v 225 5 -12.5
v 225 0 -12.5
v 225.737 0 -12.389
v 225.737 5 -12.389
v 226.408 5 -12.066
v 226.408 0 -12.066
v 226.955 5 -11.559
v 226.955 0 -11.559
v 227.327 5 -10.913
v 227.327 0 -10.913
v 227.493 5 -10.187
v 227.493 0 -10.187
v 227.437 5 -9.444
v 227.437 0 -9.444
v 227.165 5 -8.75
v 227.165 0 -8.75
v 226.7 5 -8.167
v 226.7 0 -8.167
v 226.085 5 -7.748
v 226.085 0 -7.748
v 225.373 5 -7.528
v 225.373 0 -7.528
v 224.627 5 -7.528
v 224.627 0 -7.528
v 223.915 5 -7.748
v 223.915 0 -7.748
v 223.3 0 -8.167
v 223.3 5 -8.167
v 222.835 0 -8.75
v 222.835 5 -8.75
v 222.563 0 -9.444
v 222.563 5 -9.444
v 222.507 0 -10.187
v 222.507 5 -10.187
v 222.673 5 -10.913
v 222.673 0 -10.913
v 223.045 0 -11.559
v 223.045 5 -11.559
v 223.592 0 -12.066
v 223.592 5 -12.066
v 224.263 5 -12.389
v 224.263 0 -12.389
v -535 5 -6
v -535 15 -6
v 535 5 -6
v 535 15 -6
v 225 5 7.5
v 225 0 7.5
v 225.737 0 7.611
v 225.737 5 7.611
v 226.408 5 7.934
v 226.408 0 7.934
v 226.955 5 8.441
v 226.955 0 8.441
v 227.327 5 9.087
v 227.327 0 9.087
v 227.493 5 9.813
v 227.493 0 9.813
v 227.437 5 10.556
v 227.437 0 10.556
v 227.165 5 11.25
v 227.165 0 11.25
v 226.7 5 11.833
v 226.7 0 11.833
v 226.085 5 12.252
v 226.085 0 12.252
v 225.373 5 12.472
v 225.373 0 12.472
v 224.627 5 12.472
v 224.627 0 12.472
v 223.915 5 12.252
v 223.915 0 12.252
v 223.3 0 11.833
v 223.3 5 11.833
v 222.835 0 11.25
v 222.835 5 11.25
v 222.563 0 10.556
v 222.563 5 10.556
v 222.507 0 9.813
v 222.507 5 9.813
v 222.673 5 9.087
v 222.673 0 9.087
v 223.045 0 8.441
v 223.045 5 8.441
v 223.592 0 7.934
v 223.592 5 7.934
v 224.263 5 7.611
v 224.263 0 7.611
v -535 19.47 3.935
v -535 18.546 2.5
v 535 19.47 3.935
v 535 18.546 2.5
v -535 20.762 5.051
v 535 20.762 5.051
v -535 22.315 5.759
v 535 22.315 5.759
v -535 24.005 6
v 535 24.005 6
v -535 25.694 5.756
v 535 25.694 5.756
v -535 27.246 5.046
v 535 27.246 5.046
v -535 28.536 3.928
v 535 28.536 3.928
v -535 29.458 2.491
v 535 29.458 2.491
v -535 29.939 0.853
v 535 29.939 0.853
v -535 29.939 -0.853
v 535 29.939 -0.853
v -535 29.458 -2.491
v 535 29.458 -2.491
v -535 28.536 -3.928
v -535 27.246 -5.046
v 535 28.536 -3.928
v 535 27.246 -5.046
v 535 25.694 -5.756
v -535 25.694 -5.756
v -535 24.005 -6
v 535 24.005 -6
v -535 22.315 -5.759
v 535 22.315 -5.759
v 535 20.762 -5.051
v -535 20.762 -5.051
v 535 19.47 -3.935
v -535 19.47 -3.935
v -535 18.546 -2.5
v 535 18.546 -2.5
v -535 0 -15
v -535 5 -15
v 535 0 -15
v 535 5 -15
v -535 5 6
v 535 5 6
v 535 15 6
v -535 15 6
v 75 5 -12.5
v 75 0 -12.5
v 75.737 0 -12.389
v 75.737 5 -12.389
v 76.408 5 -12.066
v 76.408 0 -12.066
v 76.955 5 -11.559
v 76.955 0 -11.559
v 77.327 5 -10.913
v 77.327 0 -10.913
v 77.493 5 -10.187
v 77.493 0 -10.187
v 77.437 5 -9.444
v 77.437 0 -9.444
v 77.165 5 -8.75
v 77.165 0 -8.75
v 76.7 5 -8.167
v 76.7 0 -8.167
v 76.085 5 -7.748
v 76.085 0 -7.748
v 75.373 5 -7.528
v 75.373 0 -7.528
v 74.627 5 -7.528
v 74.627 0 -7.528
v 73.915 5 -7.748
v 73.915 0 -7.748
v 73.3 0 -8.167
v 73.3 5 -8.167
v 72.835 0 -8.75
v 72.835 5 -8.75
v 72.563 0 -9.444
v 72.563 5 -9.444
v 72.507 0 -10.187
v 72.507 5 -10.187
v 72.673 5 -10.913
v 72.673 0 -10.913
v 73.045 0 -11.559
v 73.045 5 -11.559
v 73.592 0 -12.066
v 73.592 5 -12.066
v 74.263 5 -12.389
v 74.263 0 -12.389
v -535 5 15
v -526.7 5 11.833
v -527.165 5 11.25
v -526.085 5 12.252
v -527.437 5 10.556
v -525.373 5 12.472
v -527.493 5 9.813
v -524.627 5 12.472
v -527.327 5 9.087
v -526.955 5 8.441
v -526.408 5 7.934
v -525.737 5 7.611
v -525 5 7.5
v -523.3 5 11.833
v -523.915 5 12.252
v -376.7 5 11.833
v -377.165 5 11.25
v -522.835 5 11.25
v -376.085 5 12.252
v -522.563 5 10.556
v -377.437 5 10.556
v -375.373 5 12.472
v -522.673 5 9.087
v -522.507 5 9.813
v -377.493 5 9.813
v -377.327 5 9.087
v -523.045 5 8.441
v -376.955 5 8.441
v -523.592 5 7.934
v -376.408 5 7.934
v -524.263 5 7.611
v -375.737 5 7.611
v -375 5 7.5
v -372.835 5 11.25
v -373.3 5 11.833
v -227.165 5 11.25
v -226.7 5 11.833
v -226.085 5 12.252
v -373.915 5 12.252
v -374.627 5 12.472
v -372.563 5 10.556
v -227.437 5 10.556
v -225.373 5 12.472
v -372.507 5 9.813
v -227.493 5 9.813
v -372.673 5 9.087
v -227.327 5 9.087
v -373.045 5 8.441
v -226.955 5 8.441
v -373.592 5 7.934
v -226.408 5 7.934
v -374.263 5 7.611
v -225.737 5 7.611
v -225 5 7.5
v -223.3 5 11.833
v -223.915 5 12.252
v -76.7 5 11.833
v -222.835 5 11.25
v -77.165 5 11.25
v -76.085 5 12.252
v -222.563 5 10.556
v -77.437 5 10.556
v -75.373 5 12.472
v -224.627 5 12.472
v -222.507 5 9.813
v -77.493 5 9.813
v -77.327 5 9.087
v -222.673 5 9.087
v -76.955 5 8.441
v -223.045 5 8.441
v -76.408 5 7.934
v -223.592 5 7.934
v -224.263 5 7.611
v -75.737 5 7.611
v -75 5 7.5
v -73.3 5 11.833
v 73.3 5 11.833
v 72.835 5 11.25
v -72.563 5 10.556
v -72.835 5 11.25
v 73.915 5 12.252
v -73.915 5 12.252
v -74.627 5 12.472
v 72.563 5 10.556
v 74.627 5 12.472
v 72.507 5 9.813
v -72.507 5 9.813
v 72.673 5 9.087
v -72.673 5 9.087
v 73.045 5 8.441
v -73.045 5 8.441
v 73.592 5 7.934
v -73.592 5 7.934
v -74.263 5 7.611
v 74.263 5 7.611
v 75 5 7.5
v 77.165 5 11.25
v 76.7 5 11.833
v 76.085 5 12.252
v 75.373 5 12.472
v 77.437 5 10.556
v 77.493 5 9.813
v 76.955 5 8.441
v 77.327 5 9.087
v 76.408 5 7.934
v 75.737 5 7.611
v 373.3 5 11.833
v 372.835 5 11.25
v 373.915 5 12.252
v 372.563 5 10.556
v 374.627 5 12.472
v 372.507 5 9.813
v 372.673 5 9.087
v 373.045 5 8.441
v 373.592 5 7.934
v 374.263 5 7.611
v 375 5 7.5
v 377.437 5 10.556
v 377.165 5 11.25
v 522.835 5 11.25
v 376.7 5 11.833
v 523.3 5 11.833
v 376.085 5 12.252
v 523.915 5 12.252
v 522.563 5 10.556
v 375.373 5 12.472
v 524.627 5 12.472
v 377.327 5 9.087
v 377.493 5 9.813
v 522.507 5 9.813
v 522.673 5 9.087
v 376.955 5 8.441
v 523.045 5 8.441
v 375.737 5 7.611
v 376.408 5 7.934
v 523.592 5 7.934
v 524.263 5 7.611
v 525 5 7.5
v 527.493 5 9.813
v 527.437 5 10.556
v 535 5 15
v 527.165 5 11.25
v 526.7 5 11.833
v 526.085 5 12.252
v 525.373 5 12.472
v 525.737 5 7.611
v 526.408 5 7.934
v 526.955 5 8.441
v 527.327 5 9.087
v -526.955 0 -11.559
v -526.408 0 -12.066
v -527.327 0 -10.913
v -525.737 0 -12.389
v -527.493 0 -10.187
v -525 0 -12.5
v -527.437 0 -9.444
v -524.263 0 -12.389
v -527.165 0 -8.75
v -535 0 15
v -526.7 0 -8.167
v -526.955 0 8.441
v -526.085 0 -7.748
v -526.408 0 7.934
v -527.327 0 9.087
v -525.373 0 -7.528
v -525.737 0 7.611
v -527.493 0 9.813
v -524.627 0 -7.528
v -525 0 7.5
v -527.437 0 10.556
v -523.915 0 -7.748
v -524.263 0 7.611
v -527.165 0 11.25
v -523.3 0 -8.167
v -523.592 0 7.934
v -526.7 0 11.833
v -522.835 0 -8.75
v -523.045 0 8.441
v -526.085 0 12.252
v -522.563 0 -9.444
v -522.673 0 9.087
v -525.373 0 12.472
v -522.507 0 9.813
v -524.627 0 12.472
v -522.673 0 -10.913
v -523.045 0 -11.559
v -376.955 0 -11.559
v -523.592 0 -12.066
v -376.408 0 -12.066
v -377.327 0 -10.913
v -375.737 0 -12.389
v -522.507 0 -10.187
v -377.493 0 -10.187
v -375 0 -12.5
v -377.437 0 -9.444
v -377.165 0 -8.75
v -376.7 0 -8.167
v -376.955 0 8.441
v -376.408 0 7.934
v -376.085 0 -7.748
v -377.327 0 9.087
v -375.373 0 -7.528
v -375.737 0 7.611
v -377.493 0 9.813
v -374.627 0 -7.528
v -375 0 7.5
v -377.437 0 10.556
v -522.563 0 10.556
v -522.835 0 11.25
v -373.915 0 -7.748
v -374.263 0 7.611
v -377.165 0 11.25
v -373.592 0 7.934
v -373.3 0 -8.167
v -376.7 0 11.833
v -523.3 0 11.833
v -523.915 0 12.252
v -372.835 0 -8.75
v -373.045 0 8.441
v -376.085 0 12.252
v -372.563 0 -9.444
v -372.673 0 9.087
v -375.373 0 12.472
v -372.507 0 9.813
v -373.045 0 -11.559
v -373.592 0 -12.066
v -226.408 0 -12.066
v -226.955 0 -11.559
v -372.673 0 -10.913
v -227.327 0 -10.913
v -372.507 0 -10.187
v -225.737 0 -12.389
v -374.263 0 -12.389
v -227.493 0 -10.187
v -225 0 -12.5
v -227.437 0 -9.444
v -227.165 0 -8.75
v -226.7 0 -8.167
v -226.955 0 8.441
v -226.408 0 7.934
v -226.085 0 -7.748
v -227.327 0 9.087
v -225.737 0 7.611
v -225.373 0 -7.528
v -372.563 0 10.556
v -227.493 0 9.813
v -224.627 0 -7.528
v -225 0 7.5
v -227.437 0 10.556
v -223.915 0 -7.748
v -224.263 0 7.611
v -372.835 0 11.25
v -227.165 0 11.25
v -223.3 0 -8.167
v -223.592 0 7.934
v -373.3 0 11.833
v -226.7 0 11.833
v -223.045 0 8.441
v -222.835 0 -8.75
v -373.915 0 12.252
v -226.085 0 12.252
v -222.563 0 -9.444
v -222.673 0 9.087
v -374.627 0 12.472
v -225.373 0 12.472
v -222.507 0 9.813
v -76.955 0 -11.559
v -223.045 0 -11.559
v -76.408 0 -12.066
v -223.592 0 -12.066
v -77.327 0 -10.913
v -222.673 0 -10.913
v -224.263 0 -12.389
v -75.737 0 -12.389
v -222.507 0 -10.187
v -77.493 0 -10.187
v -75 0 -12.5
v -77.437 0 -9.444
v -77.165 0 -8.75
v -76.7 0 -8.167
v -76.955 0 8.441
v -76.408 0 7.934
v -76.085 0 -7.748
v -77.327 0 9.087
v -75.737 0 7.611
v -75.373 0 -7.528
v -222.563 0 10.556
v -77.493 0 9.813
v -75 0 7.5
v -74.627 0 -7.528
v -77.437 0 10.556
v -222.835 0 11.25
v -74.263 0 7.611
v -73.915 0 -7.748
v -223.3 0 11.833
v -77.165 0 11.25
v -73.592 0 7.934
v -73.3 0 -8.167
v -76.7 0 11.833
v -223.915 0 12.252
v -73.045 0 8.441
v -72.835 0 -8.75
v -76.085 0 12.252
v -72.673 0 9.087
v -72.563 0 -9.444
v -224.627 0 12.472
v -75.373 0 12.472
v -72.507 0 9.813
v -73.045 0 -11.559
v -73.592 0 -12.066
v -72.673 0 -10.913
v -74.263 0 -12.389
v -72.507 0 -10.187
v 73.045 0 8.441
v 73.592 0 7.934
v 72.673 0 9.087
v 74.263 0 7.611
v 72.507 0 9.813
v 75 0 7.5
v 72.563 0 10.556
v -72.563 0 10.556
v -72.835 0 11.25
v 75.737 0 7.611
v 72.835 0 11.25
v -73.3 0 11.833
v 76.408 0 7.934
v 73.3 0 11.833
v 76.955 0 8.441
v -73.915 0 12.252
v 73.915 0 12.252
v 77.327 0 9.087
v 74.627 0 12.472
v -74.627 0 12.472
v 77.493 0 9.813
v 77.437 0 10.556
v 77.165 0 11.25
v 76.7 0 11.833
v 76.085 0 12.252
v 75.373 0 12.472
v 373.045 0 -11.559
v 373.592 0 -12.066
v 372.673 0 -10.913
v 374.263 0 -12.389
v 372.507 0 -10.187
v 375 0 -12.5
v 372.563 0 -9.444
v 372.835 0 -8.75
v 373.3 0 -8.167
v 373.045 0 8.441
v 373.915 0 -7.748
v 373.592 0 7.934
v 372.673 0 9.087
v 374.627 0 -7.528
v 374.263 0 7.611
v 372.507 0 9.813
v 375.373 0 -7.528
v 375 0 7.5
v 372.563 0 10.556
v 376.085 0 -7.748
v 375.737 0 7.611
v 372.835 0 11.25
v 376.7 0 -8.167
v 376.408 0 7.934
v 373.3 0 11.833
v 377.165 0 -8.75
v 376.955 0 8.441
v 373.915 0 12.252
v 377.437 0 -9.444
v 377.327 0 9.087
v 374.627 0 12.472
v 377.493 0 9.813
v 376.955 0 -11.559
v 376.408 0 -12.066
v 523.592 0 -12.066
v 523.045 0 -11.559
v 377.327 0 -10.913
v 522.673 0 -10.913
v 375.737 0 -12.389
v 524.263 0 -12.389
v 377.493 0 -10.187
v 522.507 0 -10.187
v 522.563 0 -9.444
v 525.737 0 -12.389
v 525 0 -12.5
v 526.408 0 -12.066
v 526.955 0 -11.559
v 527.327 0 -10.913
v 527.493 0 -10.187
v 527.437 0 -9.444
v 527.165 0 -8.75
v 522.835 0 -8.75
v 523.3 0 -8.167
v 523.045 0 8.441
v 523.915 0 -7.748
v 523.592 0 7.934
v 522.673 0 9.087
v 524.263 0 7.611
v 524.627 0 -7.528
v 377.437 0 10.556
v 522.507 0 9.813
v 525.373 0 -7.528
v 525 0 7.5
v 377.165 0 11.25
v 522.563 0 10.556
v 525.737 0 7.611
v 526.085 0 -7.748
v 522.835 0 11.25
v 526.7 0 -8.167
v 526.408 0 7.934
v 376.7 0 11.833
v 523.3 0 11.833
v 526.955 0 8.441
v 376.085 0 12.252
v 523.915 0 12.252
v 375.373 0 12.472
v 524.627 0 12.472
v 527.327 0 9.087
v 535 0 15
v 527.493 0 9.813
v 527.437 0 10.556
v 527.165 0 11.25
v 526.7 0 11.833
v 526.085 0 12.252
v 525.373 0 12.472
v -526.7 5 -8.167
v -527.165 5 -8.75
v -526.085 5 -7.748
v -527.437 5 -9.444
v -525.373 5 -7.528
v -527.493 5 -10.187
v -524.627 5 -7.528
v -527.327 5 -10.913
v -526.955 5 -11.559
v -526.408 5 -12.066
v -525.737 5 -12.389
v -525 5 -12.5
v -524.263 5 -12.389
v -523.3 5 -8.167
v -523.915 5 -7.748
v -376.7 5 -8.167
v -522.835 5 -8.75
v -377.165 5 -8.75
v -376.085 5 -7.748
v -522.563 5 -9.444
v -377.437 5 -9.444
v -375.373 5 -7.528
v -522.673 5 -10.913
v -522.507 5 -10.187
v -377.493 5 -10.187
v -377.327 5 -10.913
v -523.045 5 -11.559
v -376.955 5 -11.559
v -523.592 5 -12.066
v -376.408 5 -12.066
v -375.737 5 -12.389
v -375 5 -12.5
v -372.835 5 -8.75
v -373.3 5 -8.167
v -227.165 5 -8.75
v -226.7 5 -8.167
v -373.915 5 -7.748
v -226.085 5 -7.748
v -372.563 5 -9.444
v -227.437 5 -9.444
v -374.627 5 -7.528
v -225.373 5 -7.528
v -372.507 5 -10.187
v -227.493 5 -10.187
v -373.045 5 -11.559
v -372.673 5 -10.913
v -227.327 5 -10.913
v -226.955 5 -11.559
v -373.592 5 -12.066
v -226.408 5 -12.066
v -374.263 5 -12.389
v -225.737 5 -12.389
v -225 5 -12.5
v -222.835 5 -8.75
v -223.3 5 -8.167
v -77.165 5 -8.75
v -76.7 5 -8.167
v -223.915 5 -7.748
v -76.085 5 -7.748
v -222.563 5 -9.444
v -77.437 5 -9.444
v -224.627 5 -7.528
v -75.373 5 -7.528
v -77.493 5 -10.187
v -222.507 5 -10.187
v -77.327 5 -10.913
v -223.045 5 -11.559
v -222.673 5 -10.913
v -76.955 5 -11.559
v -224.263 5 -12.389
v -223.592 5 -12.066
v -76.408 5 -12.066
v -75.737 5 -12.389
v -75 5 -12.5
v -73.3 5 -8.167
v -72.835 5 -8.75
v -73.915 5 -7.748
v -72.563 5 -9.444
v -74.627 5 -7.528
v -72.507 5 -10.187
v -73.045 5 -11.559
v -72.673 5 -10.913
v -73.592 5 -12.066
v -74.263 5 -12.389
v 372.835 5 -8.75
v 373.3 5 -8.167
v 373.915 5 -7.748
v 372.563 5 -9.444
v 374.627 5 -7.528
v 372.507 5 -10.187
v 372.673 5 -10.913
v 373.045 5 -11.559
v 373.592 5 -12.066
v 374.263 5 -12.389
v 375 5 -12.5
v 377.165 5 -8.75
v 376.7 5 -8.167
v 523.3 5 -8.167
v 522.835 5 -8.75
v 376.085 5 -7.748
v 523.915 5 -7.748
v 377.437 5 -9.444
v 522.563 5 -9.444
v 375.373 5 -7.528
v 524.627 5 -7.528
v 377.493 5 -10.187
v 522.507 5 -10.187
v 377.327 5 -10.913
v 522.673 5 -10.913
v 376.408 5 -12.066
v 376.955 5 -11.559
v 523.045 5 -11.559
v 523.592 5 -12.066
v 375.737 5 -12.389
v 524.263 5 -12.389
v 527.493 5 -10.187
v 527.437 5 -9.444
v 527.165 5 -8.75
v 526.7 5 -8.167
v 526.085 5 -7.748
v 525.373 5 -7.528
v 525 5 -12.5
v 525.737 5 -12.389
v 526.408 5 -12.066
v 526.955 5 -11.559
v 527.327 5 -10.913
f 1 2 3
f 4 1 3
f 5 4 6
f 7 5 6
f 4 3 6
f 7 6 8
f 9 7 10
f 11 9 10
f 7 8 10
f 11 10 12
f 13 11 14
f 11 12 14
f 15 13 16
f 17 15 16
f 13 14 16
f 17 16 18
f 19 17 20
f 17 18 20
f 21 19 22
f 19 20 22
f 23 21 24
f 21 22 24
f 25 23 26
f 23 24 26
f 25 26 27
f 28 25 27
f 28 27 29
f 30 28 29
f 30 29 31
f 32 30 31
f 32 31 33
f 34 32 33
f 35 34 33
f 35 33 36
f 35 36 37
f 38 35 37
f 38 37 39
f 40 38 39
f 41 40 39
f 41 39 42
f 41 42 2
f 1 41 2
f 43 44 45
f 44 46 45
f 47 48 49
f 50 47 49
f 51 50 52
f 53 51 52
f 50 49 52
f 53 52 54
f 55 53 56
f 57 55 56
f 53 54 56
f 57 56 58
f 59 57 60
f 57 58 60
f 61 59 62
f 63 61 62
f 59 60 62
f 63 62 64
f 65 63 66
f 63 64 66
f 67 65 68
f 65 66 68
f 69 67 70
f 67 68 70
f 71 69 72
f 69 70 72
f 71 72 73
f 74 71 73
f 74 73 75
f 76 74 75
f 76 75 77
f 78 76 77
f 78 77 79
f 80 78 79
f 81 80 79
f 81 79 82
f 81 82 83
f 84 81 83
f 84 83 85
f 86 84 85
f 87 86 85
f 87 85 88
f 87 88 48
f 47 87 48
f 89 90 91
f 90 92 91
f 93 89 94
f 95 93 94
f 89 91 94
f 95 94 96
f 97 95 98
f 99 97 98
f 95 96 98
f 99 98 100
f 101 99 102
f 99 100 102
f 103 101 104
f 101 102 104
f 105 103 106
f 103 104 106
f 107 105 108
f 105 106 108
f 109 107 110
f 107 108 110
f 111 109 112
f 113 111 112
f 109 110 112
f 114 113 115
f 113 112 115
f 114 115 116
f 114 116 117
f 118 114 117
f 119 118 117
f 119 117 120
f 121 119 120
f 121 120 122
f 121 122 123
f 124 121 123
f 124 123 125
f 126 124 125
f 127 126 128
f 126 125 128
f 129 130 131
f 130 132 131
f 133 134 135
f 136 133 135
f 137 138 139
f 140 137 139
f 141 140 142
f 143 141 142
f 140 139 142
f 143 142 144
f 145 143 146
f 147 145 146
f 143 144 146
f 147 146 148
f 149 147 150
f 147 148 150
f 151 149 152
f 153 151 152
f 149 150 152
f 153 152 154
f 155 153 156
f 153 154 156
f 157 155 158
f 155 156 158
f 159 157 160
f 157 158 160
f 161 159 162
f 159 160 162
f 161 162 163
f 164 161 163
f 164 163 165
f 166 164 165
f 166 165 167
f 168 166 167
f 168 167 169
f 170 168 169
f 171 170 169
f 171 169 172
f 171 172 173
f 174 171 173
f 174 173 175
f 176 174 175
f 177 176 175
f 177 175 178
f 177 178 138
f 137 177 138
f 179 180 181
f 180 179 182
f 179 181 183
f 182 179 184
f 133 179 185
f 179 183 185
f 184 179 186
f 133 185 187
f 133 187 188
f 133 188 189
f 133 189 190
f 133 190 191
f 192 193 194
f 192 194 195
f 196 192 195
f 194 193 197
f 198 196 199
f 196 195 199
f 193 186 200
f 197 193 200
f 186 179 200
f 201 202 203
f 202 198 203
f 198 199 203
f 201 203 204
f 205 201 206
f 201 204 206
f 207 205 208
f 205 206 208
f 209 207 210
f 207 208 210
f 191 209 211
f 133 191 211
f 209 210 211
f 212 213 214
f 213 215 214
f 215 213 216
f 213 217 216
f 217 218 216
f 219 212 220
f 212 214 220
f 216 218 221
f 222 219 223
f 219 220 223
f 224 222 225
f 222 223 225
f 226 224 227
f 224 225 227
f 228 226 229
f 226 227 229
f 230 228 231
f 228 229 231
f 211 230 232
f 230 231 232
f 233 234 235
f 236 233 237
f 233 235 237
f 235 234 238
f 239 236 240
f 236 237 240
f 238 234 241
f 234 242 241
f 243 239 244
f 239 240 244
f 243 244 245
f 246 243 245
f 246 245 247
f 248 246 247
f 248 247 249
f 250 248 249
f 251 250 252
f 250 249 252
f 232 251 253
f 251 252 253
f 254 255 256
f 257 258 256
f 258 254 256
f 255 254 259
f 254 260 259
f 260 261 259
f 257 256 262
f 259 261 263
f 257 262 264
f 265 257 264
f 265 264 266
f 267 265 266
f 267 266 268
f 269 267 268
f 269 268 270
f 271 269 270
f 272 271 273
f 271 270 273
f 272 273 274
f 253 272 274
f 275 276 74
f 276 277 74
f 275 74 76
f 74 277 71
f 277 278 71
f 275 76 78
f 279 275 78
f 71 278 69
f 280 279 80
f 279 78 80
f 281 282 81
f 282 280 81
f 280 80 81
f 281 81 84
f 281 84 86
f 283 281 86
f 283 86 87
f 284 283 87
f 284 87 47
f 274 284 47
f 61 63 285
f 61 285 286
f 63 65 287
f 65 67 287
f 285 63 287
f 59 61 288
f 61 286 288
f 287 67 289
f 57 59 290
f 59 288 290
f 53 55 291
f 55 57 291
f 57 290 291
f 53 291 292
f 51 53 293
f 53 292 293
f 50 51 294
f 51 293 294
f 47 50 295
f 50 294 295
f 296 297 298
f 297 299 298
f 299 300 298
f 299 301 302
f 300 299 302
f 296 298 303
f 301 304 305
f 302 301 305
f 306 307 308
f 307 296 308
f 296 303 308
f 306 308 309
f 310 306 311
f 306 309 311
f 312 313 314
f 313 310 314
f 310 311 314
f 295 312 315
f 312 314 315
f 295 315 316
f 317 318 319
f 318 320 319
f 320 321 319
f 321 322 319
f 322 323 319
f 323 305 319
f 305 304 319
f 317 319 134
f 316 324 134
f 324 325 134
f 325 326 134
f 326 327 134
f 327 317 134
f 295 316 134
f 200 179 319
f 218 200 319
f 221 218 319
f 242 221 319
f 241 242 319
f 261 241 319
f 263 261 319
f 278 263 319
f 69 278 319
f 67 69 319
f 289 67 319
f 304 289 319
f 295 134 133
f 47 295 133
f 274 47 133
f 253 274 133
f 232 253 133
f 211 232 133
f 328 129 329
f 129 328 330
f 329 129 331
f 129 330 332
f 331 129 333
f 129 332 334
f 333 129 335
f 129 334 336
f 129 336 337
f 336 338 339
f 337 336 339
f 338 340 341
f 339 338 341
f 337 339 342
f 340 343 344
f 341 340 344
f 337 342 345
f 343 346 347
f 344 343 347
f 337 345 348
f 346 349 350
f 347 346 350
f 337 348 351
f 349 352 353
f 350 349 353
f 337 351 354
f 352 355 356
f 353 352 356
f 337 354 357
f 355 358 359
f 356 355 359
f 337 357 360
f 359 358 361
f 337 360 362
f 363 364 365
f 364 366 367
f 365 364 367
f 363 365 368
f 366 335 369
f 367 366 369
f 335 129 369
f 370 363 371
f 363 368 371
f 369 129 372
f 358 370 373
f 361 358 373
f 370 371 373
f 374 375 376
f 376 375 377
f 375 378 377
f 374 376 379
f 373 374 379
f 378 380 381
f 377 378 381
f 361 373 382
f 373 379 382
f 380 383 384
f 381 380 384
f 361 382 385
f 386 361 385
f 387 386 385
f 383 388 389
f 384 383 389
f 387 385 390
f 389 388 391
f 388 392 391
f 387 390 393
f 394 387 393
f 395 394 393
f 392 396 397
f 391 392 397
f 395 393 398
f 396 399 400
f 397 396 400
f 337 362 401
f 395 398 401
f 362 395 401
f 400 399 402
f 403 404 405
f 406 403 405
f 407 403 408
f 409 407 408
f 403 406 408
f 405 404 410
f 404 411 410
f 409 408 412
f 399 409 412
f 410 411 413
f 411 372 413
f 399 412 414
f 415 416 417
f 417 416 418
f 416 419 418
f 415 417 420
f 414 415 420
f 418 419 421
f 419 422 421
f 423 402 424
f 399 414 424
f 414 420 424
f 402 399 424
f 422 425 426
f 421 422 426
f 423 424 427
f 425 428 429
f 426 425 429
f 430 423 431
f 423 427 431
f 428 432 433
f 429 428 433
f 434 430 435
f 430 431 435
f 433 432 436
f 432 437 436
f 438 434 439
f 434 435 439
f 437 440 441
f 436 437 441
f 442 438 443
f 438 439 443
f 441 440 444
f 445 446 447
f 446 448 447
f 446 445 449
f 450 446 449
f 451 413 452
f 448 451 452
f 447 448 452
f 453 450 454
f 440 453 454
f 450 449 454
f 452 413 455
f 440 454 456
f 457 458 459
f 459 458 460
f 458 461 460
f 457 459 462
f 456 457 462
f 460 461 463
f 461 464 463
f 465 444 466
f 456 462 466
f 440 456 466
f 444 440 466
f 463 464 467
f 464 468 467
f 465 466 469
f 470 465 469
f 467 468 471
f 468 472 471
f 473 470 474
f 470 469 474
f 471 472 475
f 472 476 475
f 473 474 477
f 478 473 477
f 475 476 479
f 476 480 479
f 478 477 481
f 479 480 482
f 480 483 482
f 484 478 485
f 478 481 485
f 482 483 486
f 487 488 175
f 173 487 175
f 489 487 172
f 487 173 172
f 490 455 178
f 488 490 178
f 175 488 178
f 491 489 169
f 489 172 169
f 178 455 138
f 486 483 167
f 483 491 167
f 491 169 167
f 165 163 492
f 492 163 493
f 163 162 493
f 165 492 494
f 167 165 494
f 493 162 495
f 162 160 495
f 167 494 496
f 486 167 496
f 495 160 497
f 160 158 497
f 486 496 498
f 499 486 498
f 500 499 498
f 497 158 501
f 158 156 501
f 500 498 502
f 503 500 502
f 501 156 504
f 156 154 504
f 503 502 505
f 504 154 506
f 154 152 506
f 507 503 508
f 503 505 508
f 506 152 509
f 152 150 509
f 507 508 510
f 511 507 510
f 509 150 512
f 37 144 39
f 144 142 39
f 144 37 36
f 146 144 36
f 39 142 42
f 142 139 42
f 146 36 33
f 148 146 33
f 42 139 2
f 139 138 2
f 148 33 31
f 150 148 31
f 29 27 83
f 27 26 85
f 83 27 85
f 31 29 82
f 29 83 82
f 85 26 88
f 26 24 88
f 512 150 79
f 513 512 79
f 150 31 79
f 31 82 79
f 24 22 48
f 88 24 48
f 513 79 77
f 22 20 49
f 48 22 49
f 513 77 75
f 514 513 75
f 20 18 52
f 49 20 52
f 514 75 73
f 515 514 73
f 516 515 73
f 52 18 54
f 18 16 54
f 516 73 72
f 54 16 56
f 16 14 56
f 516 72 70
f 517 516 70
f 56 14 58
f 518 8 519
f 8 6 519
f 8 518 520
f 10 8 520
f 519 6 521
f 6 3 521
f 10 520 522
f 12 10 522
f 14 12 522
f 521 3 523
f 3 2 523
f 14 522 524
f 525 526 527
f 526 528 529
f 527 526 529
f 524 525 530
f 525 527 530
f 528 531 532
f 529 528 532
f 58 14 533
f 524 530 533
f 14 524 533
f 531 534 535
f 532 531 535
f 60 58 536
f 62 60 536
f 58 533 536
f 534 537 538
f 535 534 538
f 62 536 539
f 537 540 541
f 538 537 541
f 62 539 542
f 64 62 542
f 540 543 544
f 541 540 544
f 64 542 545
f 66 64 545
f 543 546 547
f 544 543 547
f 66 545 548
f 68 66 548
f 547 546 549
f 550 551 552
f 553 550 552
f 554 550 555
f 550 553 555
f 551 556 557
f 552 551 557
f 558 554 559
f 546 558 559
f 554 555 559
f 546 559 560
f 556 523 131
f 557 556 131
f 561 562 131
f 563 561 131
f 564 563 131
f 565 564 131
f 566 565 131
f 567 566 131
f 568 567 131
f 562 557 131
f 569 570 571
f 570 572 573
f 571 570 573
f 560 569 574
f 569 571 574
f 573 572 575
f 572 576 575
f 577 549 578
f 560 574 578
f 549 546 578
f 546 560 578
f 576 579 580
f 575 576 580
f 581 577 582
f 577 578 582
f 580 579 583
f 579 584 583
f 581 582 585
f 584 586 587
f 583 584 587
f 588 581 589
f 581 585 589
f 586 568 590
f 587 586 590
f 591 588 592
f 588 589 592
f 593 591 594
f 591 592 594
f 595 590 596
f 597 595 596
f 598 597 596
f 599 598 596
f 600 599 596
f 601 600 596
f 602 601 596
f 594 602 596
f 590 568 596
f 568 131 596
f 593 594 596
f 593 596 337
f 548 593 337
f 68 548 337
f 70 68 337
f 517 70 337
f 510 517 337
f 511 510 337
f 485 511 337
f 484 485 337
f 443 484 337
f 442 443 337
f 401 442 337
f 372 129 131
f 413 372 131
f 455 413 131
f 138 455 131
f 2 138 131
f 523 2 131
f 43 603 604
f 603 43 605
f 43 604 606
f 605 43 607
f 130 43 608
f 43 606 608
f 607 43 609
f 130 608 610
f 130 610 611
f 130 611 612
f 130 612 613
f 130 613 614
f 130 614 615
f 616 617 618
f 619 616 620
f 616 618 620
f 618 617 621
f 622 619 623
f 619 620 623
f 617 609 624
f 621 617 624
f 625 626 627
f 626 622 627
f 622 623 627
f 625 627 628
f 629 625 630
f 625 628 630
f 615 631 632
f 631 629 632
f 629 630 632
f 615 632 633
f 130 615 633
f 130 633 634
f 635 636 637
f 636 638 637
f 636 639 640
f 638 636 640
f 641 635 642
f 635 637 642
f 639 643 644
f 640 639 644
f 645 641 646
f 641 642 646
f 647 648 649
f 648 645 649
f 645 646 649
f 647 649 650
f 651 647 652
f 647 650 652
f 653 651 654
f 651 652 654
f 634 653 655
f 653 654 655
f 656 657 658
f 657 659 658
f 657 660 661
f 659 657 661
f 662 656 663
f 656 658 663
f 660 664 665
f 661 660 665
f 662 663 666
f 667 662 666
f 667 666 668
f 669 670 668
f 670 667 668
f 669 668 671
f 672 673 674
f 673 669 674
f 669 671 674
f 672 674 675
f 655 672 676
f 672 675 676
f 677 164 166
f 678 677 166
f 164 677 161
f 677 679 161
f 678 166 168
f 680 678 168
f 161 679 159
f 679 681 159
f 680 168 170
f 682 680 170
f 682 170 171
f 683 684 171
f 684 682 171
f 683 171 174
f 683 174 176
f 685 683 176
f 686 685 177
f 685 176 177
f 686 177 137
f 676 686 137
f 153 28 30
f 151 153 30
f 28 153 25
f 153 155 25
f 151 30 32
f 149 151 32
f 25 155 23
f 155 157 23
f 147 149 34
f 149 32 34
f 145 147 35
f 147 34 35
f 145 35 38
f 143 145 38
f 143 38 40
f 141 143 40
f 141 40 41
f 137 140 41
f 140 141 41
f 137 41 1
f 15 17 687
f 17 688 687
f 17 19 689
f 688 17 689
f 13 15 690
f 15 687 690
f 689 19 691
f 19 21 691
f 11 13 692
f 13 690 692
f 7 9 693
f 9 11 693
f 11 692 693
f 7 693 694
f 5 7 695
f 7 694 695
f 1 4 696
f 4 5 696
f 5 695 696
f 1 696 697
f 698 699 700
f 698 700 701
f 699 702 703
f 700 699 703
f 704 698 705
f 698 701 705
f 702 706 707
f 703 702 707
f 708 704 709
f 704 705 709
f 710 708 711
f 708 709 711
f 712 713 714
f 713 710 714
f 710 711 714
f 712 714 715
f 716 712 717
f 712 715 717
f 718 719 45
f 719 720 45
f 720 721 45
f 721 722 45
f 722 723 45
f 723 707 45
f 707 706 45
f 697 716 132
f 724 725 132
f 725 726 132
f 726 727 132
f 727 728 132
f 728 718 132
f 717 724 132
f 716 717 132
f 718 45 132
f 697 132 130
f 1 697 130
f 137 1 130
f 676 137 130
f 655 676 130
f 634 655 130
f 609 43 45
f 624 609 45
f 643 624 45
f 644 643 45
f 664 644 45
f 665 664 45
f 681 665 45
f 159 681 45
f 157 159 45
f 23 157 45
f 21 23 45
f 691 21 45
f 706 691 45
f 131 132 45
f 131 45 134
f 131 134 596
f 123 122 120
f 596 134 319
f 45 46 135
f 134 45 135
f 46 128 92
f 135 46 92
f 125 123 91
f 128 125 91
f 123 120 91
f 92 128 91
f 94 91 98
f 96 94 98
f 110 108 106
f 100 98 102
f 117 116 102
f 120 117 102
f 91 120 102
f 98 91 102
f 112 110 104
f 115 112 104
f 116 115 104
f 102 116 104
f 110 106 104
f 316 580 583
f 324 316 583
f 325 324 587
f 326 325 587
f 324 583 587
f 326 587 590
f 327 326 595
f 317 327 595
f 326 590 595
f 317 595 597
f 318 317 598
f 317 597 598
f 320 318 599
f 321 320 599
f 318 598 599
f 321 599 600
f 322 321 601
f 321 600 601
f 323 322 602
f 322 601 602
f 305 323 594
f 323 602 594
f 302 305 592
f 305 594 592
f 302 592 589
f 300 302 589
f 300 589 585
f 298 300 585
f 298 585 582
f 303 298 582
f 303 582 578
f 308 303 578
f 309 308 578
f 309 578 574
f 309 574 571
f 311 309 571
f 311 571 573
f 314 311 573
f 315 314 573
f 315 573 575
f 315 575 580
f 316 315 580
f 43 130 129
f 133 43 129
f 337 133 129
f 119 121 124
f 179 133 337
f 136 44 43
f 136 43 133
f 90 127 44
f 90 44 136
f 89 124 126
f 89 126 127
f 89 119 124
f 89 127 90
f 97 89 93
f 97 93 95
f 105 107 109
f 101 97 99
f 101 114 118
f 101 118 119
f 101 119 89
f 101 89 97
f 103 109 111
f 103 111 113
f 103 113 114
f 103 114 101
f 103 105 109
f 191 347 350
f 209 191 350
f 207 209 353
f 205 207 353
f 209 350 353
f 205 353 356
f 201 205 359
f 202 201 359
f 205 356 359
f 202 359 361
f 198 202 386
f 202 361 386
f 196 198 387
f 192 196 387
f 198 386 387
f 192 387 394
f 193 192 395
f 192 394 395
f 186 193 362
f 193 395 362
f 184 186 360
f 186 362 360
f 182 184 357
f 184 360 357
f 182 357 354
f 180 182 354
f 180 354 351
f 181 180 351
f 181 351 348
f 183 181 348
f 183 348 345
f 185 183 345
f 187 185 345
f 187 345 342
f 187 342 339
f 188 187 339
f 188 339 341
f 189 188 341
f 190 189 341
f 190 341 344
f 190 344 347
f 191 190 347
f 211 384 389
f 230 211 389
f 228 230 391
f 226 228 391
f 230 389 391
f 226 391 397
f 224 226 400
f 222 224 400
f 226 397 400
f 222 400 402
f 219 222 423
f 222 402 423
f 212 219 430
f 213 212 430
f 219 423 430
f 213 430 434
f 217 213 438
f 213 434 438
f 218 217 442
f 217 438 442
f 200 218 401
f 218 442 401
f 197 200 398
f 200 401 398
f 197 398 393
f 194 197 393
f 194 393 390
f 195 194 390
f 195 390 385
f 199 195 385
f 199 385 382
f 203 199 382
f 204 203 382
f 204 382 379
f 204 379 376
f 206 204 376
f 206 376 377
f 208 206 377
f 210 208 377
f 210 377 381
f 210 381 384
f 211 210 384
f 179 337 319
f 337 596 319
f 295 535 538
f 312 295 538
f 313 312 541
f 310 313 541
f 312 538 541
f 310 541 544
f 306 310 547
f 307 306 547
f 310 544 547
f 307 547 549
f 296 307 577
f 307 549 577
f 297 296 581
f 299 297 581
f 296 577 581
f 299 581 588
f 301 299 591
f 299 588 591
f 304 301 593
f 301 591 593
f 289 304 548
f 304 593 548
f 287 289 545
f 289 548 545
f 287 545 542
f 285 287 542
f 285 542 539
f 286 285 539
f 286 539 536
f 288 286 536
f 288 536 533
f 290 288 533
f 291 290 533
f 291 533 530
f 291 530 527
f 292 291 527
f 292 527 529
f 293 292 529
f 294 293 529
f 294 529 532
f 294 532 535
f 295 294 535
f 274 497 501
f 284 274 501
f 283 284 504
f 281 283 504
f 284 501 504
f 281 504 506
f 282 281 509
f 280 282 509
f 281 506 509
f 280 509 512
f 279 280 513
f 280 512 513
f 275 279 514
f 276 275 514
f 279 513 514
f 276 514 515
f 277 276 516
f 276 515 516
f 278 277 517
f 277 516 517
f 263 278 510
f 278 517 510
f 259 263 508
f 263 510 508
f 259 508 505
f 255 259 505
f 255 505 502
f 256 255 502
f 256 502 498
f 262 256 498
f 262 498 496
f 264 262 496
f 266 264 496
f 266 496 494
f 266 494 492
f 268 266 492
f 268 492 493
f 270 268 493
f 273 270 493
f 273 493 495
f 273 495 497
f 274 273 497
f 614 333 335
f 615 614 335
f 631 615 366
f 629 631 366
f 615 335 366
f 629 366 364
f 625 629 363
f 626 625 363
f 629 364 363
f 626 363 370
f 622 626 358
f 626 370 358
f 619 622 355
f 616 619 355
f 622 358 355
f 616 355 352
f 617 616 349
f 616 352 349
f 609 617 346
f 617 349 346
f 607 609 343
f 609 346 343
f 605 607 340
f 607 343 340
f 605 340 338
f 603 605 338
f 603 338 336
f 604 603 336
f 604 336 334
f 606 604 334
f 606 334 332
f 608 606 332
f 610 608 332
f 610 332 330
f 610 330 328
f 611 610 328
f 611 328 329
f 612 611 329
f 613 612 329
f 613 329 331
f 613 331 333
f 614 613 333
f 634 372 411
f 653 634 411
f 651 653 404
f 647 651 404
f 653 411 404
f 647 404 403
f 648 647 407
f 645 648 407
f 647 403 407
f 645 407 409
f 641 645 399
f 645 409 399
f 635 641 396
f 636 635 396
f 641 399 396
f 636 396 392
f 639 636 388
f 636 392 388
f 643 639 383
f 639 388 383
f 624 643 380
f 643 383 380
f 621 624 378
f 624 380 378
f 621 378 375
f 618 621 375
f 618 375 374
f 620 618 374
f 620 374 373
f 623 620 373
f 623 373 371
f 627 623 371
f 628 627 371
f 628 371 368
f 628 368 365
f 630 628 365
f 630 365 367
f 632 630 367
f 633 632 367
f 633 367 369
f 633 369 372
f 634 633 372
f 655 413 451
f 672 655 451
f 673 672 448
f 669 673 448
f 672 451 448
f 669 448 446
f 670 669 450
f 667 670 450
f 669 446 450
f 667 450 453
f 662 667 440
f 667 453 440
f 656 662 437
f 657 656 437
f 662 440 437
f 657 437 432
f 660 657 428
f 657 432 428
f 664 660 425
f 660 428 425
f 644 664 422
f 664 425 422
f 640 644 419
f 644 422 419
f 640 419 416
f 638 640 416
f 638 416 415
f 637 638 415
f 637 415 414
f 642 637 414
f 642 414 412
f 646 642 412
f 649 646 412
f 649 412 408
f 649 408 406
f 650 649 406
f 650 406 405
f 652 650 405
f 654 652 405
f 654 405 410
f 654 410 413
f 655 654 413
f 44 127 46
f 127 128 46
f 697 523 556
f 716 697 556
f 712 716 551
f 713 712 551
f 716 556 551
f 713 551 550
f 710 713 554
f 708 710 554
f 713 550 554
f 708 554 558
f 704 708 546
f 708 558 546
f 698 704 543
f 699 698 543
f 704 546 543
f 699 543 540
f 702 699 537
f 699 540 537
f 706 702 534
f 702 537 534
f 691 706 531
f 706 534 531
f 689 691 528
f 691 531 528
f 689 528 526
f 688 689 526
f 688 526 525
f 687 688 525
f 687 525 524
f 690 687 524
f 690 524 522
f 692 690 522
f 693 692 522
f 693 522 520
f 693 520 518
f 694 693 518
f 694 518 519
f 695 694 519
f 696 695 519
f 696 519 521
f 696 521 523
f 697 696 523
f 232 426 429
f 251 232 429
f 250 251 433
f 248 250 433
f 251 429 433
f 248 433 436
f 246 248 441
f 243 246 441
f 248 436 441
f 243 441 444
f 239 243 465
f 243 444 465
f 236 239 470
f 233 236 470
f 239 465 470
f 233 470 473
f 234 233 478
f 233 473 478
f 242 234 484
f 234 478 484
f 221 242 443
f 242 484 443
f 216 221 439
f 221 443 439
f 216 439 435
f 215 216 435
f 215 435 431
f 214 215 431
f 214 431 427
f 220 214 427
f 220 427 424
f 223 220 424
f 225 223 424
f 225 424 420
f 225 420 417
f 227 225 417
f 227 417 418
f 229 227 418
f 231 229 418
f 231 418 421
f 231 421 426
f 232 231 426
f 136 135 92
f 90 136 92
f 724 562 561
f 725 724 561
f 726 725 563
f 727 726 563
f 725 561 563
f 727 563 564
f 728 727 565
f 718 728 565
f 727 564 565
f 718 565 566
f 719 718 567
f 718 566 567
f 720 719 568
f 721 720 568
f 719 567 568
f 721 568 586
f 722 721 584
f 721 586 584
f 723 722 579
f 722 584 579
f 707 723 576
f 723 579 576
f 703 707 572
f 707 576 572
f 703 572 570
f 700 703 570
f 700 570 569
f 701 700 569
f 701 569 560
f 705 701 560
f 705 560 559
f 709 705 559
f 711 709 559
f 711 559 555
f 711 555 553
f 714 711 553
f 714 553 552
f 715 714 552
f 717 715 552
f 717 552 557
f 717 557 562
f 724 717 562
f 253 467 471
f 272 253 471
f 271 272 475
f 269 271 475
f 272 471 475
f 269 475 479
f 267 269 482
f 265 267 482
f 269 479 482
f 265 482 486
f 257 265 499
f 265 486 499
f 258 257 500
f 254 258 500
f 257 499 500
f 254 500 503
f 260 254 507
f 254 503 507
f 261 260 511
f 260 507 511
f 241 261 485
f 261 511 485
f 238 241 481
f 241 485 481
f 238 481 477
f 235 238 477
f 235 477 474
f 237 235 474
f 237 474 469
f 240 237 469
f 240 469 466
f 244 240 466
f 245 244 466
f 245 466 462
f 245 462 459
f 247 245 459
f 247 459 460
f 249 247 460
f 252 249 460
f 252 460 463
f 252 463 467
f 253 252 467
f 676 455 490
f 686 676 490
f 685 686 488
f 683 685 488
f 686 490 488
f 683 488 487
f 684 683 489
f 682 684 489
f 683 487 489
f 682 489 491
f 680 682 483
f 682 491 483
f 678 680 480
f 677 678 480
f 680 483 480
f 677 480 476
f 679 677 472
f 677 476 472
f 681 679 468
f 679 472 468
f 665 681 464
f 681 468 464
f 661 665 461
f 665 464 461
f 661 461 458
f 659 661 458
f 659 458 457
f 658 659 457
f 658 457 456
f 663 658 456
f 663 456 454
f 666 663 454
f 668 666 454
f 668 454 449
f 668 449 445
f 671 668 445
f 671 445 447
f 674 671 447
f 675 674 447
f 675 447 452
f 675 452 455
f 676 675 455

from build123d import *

# Parameters (mm, degrees)
EXTRUDE_1_DEPTH        = 535
SKETCH_2_R             = 2.5
CUT_EXTRUDE_1_DEPTH    = 1070
PATTERN_LINEAR_1_COUNT = 8
PATTERN_LINEAR_1_PITCH = 150


with BuildPart() as part:
    # Эскиз1 → Бобышка-Вытянуть1 (new, symmetric)
    with BuildSketch(Plane(origin=(0, 0, 0), x_dir=(0, 0, -1), z_dir=(1, 0, 0))):
        with BuildLine():
            Line((-6, 15), (-2.5, 18.545643943))
            ThreePointArc((-2.5, 18.545643943), (0, 30), (2.5, 18.545643943))
            Line((2.5, 18.545643943), (6, 15))
            Line((6, 15), (6, 5))
            Line((6, 5), (15, 5))
            Line((15, 5), (15, 0))
            Line((15, 0), (-15, 0))
            Line((-15, 0), (-15, 5))
            Line((-15, 5), (-6, 5))
            Line((-6, 5), (-6, 15))
        make_face()
    extrude(amount=EXTRUDE_1_DEPTH, both=True)

    # Эскиз2 → Вырез-Вытянуть1 (cut)
    with BuildSketch(Plane.XZ):
        with Locations(Location((-525, 10, 0), (0, 0, 270))):
            Circle(SKETCH_2_R)
        with Locations(Location((-525, -10, 0), (0, 0, 270))):
            Circle(SKETCH_2_R)
    cut_extrude_1 = extrude(amount=-CUT_EXTRUDE_1_DEPTH, mode=Mode.SUBTRACT)

    # Линейный массив1: Вырез-Вытянуть1 ×8
    with Locations(*[(i * PATTERN_LINEAR_1_PITCH, 0, 0) for i in range(1, PATTERN_LINEAR_1_COUNT)]):
        add(cut_extrude_1, mode=Mode.SUBTRACT)


solid = part.part
